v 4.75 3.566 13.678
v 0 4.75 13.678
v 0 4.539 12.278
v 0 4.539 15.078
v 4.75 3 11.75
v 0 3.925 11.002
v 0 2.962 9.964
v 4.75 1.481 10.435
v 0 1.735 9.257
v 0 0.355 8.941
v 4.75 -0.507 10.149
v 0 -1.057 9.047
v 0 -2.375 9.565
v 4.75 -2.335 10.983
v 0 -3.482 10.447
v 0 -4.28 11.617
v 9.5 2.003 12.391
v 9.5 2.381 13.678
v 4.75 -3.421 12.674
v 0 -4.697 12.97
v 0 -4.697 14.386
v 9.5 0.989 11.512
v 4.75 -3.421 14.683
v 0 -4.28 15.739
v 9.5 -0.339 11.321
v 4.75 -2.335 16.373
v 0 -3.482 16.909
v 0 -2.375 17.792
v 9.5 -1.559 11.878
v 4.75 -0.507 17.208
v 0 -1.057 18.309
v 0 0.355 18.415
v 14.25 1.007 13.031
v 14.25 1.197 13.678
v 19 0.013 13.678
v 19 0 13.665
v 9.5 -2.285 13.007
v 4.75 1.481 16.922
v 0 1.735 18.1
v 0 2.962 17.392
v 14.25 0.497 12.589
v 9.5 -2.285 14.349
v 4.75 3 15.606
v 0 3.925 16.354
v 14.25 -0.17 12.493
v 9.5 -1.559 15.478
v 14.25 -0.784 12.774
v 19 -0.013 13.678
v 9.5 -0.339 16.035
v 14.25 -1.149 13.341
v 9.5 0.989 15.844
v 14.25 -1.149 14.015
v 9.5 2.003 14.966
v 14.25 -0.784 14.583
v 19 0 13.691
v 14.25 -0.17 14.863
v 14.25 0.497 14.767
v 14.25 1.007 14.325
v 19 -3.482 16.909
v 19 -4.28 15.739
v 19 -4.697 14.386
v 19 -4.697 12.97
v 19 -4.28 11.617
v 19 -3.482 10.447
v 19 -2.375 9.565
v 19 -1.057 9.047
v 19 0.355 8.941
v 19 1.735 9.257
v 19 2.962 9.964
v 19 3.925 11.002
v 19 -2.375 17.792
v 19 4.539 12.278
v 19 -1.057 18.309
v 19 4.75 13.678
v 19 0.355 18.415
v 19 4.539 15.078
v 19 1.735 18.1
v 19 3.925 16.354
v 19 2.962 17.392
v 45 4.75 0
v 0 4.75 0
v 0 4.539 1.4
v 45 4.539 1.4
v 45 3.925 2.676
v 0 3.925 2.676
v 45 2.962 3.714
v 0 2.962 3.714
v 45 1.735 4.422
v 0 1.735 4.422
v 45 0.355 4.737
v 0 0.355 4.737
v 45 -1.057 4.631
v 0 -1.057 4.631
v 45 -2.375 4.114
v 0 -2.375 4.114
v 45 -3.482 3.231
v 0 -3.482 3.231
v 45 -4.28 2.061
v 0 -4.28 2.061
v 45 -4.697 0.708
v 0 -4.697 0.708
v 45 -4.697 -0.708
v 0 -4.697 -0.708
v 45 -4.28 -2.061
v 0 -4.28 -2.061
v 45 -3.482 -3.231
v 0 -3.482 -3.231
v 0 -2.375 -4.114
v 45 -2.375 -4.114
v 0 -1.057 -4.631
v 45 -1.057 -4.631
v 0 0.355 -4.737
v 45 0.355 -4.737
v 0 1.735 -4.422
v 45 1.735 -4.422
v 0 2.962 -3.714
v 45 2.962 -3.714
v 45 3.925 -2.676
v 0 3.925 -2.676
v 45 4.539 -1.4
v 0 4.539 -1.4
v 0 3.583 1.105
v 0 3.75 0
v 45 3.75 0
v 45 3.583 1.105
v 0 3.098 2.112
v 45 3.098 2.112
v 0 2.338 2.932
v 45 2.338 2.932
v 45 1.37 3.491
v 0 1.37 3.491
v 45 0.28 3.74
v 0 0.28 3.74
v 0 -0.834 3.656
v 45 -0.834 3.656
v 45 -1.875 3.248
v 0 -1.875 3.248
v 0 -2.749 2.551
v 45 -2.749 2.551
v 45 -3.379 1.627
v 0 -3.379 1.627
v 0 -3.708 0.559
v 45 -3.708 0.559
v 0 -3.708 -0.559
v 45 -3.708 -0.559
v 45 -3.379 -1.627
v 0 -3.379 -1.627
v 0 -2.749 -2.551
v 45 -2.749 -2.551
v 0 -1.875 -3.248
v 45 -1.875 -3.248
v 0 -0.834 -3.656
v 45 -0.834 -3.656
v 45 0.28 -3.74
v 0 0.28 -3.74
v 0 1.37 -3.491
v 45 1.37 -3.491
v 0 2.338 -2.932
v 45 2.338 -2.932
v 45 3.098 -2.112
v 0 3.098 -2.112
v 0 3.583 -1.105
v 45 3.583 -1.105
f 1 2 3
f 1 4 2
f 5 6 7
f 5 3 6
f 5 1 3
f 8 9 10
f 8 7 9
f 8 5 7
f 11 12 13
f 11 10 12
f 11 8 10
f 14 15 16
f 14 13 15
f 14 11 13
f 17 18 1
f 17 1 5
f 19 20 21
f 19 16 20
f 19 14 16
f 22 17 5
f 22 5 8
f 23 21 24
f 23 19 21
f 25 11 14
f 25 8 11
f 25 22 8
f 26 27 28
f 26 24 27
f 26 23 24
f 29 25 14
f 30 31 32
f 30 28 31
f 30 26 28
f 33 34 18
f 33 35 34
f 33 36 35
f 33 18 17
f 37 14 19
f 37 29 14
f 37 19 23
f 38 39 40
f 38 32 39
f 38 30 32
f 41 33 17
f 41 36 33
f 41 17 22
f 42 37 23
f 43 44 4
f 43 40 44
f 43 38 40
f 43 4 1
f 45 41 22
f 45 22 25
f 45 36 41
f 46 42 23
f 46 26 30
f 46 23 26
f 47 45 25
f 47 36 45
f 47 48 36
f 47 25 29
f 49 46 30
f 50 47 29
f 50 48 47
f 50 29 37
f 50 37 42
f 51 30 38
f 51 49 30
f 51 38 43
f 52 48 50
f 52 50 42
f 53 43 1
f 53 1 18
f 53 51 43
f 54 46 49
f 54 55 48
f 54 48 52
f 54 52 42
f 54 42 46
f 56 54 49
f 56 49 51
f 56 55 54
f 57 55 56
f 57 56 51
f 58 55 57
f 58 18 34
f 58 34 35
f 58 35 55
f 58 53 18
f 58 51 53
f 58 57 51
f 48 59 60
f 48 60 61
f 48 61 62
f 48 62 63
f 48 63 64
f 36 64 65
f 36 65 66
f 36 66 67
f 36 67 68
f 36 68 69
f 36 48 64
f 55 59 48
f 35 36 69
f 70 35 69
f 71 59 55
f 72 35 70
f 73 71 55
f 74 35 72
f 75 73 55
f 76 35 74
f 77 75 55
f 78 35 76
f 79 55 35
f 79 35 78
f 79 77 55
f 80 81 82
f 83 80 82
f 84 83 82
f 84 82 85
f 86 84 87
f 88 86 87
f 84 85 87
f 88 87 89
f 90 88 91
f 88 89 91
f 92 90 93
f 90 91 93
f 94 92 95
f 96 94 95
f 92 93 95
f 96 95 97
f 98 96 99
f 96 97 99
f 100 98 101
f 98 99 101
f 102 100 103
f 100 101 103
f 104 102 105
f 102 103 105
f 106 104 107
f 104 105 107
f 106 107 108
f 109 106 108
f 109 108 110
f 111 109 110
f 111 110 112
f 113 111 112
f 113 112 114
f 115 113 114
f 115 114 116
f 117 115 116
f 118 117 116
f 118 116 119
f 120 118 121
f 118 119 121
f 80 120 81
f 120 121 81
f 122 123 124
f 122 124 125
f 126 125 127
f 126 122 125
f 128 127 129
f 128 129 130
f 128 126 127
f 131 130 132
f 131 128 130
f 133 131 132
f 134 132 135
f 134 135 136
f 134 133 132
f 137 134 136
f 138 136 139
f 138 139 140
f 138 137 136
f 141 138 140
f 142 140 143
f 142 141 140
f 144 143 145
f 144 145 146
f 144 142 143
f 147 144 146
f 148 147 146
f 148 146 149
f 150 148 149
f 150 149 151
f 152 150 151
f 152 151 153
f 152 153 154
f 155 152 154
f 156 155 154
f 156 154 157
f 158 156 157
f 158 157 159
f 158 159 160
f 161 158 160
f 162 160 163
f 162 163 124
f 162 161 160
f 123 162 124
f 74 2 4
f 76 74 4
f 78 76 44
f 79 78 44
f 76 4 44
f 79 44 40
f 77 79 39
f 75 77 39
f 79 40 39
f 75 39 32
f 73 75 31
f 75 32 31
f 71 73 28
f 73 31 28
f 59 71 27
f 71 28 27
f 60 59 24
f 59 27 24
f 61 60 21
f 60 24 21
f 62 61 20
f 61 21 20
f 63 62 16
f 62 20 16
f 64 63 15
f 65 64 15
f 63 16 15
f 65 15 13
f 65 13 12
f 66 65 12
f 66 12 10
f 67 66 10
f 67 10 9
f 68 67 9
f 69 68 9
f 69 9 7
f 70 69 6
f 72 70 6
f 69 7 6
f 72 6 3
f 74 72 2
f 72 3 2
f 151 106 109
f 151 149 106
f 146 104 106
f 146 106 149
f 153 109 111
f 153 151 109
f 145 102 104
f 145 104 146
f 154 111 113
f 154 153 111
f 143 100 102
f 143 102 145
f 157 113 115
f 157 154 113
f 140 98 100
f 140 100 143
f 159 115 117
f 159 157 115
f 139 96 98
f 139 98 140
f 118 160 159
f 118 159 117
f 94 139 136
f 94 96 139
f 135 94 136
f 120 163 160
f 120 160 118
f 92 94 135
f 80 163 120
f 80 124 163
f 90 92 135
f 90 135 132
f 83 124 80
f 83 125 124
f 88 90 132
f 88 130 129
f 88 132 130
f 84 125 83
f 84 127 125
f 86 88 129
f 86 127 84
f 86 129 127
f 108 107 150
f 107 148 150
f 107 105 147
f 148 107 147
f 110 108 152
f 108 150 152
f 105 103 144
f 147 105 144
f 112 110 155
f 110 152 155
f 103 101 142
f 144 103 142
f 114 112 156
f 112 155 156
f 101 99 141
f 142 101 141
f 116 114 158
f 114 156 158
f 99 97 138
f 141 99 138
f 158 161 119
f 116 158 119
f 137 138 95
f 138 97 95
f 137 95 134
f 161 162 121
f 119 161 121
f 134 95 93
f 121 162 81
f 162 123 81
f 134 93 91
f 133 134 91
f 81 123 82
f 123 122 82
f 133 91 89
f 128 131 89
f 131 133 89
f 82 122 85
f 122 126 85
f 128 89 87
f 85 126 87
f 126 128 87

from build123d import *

# Parameters (mm, degrees)
F0_R      = 4.75
F0_R_2    = 3.75
F1_DEPTH  = 45
F2_R      = 4.75
F3_DEPTH  = 19
F3_FACE_R = 4.75


# Not quite as in the source:
# - an extrude whose draft closes it to a point is written as a loft to that point


with BuildPart() as f1:
    # F0 (on Right) → F1 (new body)
    with BuildSketch(Plane.YZ):
        Circle(F0_R)
        Circle(F0_R_2, mode=Mode.SUBTRACT)
    extrude(amount=F1_DEPTH)


with BuildPart() as f3:
    # F2 (on Right) → F3 (new body)
    with BuildSketch(Plane.YZ):
        with Locations((0, 13.678194955)):
            Circle(F2_R)
    extrude(amount=F3_DEPTH)

    # F3_face (on face) → F4 section 0
    with BuildSketch(Plane(origin=(0, 0, 13.678194955), x_dir=(0, 1, 0), z_dir=(-1, 0, 0)), mode=Mode.PRIVATE) as f4_s0:
        Circle(F3_FACE_R)
    loft([f4_s0.sketch, Vertex(19.0512094343, 0, 13.678194955)], ruled=True, mode=Mode.SUBTRACT)


solid = Compound([f1.part, f3.part])
